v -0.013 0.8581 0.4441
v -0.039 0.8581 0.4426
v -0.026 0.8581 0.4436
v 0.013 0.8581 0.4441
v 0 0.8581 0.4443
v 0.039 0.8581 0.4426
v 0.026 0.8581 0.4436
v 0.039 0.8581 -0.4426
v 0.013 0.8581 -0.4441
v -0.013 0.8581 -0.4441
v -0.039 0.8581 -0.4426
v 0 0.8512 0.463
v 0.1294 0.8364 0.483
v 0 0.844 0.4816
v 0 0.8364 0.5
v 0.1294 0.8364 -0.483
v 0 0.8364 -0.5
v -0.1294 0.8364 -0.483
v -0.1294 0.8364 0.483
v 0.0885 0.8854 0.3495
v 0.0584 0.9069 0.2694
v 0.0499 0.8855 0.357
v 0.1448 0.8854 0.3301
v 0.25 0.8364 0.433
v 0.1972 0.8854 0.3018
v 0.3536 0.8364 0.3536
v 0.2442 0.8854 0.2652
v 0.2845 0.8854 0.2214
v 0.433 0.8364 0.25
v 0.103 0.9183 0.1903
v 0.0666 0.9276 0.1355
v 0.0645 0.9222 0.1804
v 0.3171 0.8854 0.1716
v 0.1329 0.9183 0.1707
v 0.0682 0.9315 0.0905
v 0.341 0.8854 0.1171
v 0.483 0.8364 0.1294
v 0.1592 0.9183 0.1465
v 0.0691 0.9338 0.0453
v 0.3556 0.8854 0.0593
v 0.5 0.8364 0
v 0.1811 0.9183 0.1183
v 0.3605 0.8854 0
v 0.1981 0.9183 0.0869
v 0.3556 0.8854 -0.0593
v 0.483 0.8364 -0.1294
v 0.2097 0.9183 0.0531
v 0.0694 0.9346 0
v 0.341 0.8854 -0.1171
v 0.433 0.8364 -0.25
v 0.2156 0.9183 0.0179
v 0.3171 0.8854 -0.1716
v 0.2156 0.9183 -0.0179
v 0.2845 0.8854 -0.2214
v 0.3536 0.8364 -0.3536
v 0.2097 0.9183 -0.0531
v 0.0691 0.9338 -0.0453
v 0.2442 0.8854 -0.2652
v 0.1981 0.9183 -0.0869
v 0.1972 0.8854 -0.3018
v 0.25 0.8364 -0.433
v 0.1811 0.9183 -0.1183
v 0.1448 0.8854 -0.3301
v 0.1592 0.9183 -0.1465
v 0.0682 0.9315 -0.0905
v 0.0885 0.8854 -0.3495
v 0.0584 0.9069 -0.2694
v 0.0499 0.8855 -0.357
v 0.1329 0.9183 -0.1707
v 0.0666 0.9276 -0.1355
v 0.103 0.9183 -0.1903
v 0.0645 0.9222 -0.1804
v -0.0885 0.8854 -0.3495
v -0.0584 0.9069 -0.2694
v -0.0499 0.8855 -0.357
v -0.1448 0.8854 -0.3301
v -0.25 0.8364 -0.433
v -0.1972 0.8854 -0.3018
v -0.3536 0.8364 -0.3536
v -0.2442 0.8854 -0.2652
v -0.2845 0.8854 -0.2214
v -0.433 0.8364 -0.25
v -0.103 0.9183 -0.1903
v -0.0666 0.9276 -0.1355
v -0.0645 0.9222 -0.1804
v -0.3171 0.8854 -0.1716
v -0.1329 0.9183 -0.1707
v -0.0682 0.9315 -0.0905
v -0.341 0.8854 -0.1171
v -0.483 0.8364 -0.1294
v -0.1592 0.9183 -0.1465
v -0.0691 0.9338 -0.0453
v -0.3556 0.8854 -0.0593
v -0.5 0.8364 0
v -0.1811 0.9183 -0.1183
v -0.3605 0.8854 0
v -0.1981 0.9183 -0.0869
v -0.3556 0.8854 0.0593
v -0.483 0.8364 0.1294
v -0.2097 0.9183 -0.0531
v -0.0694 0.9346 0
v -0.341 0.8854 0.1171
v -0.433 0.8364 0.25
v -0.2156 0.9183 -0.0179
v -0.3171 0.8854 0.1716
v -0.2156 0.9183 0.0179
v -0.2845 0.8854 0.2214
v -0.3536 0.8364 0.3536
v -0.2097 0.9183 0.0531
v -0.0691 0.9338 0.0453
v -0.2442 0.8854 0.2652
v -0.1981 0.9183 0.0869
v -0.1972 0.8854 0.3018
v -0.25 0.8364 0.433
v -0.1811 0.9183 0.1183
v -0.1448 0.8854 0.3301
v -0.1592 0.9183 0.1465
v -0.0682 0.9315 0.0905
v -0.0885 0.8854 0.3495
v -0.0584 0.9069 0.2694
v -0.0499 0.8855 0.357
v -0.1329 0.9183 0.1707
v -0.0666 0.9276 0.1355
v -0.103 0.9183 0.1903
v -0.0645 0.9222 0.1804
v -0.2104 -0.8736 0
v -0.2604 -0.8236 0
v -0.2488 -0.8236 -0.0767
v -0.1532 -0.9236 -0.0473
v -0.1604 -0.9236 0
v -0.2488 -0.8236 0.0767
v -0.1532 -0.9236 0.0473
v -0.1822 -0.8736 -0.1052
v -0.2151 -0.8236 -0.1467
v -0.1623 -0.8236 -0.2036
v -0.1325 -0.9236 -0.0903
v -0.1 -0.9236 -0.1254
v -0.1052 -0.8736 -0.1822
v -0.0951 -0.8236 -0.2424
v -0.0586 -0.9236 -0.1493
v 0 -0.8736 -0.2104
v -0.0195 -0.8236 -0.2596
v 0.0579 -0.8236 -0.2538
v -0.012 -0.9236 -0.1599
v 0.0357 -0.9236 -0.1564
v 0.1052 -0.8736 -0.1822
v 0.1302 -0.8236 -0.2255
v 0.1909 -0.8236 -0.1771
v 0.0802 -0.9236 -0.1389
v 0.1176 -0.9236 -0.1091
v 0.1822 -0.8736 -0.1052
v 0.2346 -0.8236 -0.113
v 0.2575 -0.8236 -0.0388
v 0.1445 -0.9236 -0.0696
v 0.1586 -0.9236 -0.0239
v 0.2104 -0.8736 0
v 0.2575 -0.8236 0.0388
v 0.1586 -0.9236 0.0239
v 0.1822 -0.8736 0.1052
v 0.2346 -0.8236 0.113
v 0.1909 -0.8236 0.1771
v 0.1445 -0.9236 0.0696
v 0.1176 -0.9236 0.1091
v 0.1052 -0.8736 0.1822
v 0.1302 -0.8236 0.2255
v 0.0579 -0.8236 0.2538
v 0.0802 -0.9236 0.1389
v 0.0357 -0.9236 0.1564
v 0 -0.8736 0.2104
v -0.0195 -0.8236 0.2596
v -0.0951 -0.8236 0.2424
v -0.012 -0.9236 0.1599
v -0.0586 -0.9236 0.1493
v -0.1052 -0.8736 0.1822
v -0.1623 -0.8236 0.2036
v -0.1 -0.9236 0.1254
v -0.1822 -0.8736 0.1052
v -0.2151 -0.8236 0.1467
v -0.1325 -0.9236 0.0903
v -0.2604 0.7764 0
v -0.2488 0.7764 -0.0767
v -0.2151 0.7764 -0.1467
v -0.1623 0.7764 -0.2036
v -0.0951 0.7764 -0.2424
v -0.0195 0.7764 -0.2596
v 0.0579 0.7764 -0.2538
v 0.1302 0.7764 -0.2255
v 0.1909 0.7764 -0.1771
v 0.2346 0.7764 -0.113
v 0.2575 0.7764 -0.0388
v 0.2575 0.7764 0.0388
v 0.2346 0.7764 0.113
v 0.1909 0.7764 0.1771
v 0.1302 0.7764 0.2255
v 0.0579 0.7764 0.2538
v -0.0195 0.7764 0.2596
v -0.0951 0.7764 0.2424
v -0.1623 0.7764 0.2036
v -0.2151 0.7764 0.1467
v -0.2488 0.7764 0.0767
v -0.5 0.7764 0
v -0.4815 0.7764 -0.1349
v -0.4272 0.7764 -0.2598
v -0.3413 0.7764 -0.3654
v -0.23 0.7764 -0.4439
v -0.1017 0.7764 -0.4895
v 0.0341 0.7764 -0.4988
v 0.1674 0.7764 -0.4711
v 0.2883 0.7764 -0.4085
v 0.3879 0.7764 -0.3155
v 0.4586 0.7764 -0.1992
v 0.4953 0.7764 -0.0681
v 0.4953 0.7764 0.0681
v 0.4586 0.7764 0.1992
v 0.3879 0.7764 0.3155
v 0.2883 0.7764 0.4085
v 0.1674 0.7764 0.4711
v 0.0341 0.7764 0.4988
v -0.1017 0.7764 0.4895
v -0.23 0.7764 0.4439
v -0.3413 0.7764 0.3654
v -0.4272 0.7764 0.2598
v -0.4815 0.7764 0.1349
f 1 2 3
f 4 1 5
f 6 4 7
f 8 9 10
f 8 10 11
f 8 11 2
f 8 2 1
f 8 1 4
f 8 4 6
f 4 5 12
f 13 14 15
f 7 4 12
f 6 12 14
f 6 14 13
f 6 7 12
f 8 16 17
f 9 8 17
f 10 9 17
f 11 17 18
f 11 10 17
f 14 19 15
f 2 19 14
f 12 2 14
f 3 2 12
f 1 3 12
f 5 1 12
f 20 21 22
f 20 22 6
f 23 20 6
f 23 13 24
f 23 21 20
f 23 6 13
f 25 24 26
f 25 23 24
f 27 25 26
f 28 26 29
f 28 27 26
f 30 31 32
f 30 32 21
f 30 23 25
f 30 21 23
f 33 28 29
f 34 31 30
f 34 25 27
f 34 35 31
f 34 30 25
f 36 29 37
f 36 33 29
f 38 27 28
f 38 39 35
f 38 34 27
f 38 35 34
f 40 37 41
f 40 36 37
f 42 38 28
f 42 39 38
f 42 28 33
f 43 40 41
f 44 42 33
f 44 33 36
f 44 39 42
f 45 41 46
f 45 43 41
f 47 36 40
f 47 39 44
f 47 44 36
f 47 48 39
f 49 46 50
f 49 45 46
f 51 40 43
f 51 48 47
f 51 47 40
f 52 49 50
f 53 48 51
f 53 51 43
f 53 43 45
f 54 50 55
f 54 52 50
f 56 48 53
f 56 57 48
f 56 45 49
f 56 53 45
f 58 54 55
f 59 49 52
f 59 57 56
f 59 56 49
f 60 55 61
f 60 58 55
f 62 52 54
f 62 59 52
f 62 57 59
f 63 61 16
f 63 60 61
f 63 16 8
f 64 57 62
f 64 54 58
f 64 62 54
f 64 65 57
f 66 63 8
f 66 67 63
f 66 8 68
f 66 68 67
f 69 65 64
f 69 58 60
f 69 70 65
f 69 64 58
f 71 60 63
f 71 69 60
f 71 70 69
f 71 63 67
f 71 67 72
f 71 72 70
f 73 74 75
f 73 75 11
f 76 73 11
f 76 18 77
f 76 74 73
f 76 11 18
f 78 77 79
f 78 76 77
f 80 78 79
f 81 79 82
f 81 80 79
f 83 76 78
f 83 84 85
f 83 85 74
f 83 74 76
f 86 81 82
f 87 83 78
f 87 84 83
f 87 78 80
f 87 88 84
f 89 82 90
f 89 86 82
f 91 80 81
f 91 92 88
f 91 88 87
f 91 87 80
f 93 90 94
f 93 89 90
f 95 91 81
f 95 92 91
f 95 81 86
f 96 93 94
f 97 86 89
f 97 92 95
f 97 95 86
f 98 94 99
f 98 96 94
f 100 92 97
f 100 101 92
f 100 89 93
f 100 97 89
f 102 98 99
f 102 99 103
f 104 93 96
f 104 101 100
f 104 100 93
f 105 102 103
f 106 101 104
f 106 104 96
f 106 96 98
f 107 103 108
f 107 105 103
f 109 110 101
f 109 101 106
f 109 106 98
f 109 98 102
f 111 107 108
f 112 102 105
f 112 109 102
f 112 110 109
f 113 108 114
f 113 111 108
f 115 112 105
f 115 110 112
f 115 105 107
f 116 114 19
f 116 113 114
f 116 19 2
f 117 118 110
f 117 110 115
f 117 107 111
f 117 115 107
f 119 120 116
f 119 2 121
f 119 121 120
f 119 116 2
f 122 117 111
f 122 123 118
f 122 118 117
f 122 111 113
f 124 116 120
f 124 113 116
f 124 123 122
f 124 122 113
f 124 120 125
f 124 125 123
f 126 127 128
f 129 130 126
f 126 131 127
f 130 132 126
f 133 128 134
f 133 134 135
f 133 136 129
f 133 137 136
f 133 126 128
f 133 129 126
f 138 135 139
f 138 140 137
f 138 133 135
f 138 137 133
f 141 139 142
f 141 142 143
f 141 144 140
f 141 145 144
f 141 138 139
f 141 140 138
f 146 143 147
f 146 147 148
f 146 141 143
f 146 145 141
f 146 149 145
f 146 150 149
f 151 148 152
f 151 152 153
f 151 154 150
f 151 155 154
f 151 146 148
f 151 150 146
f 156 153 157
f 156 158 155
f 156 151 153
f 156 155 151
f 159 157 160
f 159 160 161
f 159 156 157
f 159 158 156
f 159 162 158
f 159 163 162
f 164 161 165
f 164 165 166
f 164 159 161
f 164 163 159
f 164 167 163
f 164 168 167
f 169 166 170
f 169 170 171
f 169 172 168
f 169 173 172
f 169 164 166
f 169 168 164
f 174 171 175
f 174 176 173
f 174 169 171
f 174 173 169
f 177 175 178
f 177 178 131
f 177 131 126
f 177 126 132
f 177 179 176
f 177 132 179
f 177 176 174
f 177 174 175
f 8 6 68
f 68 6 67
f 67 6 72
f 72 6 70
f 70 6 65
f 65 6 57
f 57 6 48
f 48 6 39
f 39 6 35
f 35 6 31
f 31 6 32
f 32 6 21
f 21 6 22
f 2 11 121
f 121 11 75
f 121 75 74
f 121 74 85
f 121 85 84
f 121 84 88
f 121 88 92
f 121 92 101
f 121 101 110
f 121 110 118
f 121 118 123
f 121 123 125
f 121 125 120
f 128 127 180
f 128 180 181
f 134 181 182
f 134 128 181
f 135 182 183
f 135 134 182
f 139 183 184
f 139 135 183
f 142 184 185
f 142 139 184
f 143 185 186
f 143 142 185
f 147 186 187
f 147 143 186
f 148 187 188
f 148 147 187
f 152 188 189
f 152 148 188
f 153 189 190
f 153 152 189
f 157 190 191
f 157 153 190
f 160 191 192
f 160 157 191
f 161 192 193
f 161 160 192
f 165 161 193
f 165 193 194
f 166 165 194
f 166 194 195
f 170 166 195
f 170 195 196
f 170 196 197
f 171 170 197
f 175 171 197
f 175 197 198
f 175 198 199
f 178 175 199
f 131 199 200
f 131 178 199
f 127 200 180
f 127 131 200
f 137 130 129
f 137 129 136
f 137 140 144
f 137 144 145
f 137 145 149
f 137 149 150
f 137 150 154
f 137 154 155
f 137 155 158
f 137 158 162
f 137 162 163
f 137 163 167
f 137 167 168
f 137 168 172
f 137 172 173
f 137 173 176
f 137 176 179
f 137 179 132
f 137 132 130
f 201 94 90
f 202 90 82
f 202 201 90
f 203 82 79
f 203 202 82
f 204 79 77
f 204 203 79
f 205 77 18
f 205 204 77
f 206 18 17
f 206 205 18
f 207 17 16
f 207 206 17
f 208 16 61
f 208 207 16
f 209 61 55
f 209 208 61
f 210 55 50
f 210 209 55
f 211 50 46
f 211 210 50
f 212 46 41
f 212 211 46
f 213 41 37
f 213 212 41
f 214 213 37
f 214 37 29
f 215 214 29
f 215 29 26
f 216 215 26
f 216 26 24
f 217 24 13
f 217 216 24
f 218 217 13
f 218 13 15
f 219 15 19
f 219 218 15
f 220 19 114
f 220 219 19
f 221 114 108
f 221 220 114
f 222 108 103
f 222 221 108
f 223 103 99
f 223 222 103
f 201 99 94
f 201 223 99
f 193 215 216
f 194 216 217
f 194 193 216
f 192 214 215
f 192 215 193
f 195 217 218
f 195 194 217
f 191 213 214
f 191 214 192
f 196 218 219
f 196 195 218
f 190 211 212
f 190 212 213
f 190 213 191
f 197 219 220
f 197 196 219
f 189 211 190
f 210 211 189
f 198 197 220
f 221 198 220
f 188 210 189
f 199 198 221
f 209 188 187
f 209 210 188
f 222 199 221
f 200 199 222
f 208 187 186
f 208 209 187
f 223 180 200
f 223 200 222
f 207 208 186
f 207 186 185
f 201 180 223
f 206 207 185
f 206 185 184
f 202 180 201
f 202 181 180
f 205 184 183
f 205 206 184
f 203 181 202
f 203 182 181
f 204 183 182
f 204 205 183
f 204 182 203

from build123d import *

# Parameters (mm, degrees)
DOME1_FACE_RADIUS       = 0.5
DOME1_HEIGHT            = 0.1
CUT_EXTRUDE2_DEPTH      = 2.173419235
CUT_EXTRUDE2_DEPTH_BACK = 2.173419235
CHAMFER1_SIZE           = 0.1


with BuildPart() as part:
    # Sketch1 → Revolve1 (revolve)
    with BuildSketch(Plane.XY):
        Polygon((0, 0.83643617), (-0.5, 0.83643617), (-0.5, 0.77643617), (-0.26037234, 0.77643617), (-0.26037234, -0.92356383), (0, -0.92356383), align=None)
    revolve(axis=Axis((0, 1.28856383, 0), (0, -1, 0)))

    # Dome1: a dome of height H over a round flat face of radius A is a cap of a sphere of radius (A * A + H * H) / (2 * H)
    dome1_r = (DOME1_FACE_RADIUS * DOME1_FACE_RADIUS + DOME1_HEIGHT * DOME1_HEIGHT) / (2 * DOME1_HEIGHT)
    dome1_base = Plane((0, 0.83643617, 0), z_dir=(0, 1, 0))
    with Locations(dome1_base.offset(DOME1_HEIGHT - dome1_r)):
        dome1_ball = Sphere(dome1_r, mode=Mode.PRIVATE)
    add(split(dome1_ball, bisect_by=dome1_base, keep=Keep.TOP, mode=Mode.PRIVATE))

    # Sketch2 → Cut-Extrude2 (cut, two sides: drawn at the far end of the back side and taken through both)
    with BuildSketch(Plane.XY.offset(-CUT_EXTRUDE2_DEPTH_BACK)):
        Polygon((-5.197321888, 13.839981197), (-0.069398593, 0.934582478), (-0.039027182, 0.858147018), (0.039027182, 0.858147018), (0.069398593, 0.934582478), (5.197321888, 13.839981197), (5.197321888, 41.613703556), (-5.197321888, 41.613703556), align=None)
    extrude(amount=CUT_EXTRUDE2_DEPTH + CUT_EXTRUDE2_DEPTH_BACK, mode=Mode.SUBTRACT)

    # Chamfer1
    chamfer1_edges = [part.edges().sort_by_distance(p)[0] for p in [
        (0.26037234, -0.92356383, 0),
    ]]
    chamfer(chamfer1_edges, length=CHAMFER1_SIZE)


solid = part.part
